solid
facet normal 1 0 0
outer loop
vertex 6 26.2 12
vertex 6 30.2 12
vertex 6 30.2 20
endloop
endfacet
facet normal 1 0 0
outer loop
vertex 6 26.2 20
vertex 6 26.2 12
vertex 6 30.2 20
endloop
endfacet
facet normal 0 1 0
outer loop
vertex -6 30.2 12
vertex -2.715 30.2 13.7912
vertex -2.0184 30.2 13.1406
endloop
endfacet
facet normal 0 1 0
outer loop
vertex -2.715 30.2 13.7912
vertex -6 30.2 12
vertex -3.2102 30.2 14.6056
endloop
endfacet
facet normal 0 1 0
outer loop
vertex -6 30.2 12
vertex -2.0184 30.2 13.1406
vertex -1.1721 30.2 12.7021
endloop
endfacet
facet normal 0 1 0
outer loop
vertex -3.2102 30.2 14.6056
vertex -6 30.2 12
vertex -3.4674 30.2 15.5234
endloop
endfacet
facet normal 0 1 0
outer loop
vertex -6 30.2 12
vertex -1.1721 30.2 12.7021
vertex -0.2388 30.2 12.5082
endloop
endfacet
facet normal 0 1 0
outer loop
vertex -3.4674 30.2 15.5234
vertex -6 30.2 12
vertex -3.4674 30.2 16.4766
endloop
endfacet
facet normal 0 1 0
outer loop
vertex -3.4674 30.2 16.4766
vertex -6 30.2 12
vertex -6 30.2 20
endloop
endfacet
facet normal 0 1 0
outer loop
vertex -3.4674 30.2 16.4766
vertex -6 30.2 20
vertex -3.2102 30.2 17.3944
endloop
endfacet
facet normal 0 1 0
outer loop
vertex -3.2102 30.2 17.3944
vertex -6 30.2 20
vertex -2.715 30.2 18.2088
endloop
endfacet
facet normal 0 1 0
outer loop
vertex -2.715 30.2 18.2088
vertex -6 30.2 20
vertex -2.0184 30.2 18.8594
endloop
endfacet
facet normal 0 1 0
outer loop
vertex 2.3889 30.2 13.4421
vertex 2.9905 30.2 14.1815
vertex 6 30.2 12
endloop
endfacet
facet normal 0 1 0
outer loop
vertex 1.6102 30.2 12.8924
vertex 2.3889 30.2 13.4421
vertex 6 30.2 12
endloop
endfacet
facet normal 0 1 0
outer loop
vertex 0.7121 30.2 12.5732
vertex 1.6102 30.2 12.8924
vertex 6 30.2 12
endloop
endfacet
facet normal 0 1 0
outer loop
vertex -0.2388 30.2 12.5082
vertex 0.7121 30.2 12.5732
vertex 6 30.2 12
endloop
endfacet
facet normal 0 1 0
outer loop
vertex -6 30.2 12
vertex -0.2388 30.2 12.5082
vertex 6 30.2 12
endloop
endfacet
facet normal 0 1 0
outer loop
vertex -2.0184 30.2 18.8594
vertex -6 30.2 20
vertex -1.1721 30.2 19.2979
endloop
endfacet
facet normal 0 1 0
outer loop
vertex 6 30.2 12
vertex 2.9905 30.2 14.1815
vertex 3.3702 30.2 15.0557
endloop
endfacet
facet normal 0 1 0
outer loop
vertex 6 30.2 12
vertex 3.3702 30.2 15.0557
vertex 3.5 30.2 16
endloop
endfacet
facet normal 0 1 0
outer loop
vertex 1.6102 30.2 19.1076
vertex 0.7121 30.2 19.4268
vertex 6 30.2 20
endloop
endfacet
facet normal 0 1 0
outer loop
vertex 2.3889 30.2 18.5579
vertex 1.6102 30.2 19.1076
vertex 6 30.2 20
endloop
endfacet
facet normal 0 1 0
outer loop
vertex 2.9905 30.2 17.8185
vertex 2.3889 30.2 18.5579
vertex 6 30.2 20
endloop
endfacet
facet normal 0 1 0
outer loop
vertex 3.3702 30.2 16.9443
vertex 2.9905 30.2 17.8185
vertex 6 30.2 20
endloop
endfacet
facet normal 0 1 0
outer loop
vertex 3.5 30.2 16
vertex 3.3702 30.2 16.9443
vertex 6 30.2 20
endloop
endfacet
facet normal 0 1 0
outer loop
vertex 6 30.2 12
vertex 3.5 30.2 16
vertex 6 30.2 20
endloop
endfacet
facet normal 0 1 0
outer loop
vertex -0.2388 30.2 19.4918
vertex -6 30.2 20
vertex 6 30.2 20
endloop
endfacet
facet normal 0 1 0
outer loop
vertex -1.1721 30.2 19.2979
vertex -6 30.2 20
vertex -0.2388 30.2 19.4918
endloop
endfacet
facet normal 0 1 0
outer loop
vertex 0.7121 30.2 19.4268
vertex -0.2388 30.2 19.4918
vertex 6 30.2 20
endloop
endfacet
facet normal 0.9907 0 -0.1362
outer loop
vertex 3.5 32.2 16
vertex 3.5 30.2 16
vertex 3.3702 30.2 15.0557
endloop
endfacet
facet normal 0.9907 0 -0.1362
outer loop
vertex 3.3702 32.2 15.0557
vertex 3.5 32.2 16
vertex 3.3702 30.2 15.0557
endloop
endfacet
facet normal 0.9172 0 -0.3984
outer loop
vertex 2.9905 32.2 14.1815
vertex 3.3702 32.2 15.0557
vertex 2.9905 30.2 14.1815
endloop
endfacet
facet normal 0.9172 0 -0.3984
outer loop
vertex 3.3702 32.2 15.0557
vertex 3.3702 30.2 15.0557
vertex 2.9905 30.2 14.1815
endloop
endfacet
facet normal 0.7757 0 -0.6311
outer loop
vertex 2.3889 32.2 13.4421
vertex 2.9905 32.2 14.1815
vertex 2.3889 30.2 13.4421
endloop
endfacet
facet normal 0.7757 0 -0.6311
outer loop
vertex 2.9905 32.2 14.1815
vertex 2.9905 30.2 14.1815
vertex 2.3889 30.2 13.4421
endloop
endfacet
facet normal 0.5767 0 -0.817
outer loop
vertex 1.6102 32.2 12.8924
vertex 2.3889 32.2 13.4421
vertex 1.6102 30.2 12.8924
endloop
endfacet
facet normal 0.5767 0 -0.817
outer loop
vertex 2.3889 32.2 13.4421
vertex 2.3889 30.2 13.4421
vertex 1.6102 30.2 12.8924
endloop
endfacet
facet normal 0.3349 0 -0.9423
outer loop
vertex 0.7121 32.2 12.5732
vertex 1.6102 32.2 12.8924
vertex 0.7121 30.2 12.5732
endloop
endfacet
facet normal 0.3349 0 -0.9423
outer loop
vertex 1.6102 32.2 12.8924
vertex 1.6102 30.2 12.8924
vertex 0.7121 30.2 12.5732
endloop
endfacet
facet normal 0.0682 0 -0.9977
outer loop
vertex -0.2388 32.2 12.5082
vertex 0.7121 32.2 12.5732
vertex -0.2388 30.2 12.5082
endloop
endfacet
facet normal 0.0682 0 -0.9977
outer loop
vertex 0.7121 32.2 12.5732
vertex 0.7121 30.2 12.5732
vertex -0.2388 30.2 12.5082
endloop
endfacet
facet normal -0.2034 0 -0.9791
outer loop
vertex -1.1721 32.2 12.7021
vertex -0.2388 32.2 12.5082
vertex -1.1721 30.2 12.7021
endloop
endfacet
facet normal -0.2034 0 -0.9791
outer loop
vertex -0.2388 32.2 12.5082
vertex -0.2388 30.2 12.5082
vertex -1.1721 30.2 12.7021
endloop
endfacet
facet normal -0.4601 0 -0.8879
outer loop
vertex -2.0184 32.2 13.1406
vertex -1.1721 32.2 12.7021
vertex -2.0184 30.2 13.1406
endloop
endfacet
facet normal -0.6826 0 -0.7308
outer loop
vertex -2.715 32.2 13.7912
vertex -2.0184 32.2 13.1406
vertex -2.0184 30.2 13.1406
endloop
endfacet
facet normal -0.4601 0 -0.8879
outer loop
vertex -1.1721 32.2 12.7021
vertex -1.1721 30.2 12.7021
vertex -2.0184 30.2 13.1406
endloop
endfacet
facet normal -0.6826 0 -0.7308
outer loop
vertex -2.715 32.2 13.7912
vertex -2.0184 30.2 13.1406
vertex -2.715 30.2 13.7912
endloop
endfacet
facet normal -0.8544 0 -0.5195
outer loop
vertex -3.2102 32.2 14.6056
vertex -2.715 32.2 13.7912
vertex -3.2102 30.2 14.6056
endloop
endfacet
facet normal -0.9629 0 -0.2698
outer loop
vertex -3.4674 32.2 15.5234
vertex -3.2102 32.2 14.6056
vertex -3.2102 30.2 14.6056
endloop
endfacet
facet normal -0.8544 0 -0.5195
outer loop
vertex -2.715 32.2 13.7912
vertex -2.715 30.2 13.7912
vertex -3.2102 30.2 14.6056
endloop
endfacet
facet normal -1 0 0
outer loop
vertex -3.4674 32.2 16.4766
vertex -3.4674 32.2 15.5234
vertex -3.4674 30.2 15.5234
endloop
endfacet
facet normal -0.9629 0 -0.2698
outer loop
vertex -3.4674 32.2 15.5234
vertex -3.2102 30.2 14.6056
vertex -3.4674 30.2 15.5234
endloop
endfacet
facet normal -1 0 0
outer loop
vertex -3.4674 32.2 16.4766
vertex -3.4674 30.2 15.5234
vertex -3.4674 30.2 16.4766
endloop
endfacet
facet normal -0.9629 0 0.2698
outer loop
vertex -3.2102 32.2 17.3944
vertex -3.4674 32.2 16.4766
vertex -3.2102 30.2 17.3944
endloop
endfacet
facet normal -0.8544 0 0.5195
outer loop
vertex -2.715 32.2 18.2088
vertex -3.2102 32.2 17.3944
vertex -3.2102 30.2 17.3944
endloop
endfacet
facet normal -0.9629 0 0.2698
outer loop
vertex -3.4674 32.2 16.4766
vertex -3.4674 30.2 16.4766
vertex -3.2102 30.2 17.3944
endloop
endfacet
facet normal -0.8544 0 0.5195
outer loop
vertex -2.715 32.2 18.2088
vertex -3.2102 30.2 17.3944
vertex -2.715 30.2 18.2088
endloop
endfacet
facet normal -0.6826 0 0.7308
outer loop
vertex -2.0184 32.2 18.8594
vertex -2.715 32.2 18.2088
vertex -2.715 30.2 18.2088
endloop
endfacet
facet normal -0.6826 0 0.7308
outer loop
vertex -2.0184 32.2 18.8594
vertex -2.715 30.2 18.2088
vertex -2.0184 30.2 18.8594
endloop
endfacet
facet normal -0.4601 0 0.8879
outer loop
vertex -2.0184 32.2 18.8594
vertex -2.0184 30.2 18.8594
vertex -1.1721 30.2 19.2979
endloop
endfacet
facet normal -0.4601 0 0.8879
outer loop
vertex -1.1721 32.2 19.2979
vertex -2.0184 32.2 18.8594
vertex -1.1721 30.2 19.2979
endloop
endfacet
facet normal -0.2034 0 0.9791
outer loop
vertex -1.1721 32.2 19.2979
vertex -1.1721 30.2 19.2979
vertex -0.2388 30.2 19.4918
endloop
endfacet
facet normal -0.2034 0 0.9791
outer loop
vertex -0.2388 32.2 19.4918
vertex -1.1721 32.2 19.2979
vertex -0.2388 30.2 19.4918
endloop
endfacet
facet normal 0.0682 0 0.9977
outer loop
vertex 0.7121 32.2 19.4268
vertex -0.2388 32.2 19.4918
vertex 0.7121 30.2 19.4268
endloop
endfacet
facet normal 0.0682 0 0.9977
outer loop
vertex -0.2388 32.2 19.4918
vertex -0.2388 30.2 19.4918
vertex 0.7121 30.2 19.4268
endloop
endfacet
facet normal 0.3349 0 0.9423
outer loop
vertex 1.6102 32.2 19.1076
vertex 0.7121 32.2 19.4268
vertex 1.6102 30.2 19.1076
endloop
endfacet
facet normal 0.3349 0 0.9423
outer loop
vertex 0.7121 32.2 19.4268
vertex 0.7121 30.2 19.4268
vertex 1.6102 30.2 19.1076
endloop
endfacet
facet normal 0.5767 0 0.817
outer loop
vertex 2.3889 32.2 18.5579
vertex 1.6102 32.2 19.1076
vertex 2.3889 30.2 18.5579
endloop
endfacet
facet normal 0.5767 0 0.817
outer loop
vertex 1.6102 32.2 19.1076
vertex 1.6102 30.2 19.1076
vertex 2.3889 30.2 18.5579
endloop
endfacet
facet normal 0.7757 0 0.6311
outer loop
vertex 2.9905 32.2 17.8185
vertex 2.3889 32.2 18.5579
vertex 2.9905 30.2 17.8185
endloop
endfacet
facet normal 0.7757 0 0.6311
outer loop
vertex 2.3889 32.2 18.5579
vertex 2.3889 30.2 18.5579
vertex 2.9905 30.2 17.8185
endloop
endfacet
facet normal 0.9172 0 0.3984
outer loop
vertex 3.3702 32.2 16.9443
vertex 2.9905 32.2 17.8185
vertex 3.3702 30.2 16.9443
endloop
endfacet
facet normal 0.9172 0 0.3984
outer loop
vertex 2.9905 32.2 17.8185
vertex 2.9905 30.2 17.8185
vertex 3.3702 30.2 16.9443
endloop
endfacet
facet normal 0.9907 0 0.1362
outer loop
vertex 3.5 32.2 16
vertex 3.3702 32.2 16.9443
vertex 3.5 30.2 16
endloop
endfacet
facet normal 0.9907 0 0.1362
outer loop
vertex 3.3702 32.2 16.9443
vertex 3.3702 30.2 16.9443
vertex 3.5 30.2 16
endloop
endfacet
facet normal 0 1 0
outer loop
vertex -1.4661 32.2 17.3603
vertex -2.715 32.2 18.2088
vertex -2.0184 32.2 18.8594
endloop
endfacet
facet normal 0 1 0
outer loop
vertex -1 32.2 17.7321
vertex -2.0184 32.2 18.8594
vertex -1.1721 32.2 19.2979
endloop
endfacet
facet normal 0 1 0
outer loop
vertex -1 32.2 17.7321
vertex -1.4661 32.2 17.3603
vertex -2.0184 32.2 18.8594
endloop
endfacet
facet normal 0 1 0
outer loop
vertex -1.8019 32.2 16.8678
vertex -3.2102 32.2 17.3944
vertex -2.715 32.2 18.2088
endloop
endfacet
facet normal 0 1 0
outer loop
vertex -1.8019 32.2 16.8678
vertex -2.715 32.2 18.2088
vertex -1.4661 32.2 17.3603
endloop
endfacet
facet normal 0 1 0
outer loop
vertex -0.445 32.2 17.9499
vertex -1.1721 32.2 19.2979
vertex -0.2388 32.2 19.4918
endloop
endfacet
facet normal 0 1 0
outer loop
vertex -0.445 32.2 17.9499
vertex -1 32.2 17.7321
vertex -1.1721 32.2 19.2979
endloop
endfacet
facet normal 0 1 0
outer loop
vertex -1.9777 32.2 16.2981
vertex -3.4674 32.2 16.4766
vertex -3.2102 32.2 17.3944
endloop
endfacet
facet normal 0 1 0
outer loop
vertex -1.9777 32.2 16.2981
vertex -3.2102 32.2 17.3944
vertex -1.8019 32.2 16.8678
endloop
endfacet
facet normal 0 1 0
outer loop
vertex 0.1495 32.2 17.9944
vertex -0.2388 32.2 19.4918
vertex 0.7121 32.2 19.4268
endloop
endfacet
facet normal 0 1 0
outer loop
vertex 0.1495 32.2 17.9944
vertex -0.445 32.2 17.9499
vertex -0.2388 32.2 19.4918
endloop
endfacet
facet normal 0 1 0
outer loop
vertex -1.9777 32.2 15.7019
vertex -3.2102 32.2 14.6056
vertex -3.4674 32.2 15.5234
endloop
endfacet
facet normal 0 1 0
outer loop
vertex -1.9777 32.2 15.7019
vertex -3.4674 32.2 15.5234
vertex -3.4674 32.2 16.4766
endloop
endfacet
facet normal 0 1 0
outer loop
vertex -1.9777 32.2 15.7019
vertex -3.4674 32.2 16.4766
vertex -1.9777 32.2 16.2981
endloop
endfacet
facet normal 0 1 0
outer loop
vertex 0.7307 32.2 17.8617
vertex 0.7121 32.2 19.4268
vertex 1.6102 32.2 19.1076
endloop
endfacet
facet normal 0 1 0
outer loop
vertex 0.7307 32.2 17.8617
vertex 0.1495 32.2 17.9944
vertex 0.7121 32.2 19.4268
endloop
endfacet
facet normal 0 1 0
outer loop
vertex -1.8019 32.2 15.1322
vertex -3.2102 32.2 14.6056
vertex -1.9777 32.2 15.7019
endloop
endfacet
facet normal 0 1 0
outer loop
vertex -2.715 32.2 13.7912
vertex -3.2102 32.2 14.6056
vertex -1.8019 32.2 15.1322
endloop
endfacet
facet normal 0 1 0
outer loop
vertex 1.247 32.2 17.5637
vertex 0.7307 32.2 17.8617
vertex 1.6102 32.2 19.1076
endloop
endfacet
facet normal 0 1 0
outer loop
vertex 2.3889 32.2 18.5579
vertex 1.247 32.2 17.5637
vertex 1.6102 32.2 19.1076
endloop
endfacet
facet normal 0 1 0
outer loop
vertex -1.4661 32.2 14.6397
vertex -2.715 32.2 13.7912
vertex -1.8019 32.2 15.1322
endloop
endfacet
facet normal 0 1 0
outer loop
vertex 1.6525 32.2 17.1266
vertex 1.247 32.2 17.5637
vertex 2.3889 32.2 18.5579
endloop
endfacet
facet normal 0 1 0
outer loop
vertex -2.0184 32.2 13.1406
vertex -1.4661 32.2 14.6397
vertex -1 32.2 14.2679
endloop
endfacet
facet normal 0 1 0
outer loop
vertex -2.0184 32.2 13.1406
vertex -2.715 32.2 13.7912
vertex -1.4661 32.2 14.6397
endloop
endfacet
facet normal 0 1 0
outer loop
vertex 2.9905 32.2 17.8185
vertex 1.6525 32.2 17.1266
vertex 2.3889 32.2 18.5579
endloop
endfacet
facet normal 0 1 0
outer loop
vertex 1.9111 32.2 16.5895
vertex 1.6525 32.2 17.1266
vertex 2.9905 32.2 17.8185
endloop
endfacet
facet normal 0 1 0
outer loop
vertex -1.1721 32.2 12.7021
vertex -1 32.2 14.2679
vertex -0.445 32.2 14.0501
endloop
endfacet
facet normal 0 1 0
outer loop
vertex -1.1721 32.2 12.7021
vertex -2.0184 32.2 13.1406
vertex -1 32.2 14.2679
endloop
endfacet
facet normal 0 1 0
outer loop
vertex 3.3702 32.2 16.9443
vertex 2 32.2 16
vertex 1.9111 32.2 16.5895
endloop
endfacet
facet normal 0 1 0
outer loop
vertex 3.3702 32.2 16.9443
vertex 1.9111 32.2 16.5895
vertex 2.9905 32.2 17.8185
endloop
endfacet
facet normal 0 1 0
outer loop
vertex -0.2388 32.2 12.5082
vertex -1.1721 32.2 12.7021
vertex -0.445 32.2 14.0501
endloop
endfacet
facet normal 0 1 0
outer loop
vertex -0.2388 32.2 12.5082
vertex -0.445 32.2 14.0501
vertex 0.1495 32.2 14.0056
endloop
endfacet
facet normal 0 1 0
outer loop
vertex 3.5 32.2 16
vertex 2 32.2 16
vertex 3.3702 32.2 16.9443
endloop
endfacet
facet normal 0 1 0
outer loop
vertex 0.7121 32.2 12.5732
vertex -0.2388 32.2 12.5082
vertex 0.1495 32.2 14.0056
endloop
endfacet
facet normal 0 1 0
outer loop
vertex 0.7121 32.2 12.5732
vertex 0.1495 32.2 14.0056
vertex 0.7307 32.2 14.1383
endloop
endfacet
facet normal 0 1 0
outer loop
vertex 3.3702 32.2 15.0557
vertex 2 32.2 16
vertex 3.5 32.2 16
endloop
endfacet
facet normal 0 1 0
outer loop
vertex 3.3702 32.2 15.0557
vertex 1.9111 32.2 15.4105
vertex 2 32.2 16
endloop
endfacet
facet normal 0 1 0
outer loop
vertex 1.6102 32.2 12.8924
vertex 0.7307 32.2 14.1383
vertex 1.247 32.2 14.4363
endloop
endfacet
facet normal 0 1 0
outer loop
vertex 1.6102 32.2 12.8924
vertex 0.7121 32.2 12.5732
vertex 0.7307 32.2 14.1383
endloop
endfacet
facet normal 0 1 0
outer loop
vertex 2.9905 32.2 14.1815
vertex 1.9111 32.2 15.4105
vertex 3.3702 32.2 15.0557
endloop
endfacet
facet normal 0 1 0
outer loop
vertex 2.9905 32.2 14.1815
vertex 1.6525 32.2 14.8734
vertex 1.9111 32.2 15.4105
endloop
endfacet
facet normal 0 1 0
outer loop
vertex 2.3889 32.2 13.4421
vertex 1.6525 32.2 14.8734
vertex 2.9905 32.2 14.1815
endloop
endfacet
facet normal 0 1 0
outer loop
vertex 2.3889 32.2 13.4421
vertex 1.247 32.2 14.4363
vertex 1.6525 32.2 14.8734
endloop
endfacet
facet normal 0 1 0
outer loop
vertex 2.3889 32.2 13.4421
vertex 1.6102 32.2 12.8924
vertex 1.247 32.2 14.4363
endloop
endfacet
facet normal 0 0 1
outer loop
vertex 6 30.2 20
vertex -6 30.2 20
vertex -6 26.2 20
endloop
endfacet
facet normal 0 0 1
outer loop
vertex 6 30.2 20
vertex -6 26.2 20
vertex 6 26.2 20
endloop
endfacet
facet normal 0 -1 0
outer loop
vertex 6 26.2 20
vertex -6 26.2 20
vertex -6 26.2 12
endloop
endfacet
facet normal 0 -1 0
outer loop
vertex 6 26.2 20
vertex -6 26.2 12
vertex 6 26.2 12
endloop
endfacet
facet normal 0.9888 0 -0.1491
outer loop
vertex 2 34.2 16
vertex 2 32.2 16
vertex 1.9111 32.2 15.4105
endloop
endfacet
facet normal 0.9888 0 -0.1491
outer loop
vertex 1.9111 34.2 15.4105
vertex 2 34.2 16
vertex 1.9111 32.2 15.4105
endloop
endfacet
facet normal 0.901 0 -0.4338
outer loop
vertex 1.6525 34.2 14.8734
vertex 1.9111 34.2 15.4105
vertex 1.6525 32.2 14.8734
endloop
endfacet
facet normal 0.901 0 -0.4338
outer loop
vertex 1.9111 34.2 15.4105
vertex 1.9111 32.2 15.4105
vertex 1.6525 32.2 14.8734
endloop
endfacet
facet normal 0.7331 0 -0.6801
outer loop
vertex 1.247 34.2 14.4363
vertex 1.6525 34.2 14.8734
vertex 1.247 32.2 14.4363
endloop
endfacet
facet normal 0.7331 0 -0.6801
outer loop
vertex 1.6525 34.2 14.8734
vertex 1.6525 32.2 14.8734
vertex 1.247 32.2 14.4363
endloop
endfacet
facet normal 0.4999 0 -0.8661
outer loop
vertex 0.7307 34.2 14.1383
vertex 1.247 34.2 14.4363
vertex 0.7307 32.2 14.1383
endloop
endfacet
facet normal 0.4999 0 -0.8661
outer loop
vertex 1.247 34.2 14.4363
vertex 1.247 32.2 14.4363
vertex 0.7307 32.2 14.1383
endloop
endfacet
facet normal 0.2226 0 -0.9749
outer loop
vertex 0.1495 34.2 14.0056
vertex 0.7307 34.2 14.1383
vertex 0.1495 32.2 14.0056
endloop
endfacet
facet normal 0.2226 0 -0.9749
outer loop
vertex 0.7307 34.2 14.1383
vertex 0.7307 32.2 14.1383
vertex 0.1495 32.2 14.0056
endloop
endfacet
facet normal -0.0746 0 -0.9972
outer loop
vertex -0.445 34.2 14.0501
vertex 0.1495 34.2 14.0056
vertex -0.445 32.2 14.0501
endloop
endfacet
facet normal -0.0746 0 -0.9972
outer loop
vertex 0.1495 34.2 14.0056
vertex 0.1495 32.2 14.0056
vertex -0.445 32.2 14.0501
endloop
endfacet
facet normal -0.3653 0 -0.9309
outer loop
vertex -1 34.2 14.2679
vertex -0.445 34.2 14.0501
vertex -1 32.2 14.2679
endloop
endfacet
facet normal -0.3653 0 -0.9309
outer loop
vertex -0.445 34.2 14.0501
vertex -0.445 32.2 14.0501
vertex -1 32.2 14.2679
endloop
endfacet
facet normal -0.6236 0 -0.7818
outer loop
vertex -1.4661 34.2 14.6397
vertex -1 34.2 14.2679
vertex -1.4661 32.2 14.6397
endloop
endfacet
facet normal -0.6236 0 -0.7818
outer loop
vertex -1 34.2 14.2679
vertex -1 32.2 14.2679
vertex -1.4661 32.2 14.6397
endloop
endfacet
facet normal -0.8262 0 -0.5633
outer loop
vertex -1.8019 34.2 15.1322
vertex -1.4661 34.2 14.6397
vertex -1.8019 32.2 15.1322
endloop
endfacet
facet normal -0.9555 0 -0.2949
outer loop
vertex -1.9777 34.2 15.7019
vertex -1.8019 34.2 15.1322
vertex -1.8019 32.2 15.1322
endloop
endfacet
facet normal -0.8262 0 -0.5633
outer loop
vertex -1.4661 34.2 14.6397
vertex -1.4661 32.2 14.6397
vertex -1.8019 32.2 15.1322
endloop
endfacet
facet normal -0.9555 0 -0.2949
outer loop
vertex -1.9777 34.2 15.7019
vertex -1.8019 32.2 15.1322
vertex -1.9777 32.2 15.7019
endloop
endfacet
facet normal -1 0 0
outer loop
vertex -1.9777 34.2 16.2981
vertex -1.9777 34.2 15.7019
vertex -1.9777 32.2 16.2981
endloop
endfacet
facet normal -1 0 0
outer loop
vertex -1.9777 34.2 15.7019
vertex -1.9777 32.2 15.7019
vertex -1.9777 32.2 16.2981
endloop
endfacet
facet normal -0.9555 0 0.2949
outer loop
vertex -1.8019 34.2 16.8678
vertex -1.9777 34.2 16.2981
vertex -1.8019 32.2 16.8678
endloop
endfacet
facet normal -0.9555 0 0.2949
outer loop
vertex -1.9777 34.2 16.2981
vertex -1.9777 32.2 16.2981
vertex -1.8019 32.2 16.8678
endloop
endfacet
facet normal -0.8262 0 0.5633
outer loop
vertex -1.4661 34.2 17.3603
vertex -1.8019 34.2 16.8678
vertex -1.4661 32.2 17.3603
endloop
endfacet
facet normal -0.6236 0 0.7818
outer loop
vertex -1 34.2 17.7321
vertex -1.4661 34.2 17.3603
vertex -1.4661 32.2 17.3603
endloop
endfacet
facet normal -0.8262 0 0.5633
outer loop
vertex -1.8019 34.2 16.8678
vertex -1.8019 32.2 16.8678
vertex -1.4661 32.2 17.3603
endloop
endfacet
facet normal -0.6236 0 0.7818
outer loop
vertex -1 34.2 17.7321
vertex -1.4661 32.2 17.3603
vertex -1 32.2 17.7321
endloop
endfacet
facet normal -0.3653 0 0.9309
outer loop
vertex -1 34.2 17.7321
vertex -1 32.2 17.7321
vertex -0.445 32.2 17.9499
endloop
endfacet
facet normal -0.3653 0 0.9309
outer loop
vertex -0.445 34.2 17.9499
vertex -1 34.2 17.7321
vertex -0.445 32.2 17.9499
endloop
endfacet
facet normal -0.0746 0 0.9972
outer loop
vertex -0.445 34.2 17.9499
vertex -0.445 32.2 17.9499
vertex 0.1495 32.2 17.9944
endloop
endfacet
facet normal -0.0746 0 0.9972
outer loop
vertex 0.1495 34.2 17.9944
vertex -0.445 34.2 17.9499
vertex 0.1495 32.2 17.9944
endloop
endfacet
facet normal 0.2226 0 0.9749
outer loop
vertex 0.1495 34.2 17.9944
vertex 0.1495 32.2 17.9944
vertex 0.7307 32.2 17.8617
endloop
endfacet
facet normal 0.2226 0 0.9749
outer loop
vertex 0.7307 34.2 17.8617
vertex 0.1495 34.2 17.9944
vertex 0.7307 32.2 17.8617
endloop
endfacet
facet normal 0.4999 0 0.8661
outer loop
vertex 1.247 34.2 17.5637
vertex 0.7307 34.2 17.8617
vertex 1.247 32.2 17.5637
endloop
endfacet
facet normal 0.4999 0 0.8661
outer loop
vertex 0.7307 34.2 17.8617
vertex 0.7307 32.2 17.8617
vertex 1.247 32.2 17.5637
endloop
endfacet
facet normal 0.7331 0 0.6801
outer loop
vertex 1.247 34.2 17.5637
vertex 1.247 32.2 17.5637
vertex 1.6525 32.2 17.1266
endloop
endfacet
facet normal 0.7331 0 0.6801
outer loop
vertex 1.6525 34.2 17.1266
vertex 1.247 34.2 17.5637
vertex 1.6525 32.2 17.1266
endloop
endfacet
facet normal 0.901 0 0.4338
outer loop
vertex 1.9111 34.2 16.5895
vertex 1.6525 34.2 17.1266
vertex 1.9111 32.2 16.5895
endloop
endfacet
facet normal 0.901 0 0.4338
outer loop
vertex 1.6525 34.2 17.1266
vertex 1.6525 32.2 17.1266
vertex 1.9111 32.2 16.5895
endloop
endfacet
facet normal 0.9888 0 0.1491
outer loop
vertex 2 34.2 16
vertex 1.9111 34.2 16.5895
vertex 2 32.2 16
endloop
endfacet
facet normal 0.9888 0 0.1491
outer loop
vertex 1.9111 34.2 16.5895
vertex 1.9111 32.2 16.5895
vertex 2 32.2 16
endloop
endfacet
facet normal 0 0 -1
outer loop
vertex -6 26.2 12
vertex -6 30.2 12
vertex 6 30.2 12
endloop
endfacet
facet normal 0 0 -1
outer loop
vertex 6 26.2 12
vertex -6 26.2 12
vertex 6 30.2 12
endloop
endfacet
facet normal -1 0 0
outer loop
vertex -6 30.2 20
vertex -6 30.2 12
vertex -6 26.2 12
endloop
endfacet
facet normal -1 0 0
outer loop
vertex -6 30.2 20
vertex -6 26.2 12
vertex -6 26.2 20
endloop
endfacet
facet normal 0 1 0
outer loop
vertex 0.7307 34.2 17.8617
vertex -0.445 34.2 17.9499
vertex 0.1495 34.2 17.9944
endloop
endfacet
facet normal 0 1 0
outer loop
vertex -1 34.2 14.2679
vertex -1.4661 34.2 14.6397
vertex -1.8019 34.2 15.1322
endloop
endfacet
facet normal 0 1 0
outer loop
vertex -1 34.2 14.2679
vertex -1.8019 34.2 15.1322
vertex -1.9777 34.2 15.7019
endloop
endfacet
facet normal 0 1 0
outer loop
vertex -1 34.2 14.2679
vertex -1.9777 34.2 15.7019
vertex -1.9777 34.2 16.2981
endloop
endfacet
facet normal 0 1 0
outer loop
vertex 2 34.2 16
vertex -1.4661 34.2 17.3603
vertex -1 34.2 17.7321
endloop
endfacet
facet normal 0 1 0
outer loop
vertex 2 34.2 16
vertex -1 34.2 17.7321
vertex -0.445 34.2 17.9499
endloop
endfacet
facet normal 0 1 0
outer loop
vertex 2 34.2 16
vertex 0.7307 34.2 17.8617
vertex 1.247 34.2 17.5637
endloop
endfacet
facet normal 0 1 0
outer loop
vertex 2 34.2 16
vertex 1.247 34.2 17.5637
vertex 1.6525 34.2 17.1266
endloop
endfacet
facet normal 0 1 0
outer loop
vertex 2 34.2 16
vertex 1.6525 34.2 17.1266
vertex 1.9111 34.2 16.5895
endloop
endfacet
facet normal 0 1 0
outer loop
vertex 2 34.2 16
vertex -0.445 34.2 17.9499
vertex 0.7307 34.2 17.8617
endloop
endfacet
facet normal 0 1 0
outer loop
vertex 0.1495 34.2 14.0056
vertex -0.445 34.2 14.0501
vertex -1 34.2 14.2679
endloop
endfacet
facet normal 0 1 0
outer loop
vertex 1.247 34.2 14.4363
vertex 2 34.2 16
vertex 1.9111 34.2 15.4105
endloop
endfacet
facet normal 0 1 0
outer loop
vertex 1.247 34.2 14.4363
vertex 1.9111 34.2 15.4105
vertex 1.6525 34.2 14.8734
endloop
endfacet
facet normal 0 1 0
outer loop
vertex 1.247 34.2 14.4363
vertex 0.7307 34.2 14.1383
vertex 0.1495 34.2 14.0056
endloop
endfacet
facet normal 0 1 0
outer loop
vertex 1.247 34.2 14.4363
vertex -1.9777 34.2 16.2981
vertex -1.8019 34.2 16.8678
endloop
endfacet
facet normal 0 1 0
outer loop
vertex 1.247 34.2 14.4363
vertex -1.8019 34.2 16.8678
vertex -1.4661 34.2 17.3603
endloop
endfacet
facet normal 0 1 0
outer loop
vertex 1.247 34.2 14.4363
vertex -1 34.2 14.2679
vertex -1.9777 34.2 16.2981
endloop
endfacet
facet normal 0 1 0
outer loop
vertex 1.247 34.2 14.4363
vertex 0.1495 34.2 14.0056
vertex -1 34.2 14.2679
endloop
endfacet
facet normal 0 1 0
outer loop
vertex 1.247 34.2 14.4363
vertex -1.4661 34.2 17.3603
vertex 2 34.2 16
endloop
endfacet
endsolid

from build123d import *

# Parameters (mm, degrees)
SKETCH008_W             = 12
SKETCH008_H             = 8
PAD006_DEPTH            = 4
SKETCH009_R             = 3.5
PAD007_DEPTH            = 2
SKETCH010_R             = 2
PAD008_DEPTH            = 2
BODY002_PLACEMENT_ANGLE = 90


with BuildPart() as part:
    # Sketch008 → Pad006 (new body)
    with BuildSketch(Plane.XY):
        Rectangle(SKETCH008_W, SKETCH008_H)
    extrude(amount=PAD006_DEPTH)

    # Sketch009 (on Face5 of Pad006) → Pad007 (join)
    with BuildSketch(Plane(origin=(0, 0, 0), x_dir=(1, 0, 0), z_dir=(0, 0, -1))):
        Circle(SKETCH009_R)
    extrude(amount=PAD007_DEPTH)

    # Sketch010 (on Face8 of Pad007) → Pad008 (join)
    with BuildSketch(Plane(origin=(0, 0, -2), x_dir=(1, 0, 0), z_dir=(0, 0, -1))):
        Circle(SKETCH010_R)
    extrude(amount=PAD008_DEPTH)


with BuildPart() as part_1:
    # Body002 placement: moved
    add(part.part.moved(Location((0, 30.2, 16))).rotate(Axis((0, 30.2, 16), (1, 0, 0)), BODY002_PLACEMENT_ANGLE))


solid = part_1.part
